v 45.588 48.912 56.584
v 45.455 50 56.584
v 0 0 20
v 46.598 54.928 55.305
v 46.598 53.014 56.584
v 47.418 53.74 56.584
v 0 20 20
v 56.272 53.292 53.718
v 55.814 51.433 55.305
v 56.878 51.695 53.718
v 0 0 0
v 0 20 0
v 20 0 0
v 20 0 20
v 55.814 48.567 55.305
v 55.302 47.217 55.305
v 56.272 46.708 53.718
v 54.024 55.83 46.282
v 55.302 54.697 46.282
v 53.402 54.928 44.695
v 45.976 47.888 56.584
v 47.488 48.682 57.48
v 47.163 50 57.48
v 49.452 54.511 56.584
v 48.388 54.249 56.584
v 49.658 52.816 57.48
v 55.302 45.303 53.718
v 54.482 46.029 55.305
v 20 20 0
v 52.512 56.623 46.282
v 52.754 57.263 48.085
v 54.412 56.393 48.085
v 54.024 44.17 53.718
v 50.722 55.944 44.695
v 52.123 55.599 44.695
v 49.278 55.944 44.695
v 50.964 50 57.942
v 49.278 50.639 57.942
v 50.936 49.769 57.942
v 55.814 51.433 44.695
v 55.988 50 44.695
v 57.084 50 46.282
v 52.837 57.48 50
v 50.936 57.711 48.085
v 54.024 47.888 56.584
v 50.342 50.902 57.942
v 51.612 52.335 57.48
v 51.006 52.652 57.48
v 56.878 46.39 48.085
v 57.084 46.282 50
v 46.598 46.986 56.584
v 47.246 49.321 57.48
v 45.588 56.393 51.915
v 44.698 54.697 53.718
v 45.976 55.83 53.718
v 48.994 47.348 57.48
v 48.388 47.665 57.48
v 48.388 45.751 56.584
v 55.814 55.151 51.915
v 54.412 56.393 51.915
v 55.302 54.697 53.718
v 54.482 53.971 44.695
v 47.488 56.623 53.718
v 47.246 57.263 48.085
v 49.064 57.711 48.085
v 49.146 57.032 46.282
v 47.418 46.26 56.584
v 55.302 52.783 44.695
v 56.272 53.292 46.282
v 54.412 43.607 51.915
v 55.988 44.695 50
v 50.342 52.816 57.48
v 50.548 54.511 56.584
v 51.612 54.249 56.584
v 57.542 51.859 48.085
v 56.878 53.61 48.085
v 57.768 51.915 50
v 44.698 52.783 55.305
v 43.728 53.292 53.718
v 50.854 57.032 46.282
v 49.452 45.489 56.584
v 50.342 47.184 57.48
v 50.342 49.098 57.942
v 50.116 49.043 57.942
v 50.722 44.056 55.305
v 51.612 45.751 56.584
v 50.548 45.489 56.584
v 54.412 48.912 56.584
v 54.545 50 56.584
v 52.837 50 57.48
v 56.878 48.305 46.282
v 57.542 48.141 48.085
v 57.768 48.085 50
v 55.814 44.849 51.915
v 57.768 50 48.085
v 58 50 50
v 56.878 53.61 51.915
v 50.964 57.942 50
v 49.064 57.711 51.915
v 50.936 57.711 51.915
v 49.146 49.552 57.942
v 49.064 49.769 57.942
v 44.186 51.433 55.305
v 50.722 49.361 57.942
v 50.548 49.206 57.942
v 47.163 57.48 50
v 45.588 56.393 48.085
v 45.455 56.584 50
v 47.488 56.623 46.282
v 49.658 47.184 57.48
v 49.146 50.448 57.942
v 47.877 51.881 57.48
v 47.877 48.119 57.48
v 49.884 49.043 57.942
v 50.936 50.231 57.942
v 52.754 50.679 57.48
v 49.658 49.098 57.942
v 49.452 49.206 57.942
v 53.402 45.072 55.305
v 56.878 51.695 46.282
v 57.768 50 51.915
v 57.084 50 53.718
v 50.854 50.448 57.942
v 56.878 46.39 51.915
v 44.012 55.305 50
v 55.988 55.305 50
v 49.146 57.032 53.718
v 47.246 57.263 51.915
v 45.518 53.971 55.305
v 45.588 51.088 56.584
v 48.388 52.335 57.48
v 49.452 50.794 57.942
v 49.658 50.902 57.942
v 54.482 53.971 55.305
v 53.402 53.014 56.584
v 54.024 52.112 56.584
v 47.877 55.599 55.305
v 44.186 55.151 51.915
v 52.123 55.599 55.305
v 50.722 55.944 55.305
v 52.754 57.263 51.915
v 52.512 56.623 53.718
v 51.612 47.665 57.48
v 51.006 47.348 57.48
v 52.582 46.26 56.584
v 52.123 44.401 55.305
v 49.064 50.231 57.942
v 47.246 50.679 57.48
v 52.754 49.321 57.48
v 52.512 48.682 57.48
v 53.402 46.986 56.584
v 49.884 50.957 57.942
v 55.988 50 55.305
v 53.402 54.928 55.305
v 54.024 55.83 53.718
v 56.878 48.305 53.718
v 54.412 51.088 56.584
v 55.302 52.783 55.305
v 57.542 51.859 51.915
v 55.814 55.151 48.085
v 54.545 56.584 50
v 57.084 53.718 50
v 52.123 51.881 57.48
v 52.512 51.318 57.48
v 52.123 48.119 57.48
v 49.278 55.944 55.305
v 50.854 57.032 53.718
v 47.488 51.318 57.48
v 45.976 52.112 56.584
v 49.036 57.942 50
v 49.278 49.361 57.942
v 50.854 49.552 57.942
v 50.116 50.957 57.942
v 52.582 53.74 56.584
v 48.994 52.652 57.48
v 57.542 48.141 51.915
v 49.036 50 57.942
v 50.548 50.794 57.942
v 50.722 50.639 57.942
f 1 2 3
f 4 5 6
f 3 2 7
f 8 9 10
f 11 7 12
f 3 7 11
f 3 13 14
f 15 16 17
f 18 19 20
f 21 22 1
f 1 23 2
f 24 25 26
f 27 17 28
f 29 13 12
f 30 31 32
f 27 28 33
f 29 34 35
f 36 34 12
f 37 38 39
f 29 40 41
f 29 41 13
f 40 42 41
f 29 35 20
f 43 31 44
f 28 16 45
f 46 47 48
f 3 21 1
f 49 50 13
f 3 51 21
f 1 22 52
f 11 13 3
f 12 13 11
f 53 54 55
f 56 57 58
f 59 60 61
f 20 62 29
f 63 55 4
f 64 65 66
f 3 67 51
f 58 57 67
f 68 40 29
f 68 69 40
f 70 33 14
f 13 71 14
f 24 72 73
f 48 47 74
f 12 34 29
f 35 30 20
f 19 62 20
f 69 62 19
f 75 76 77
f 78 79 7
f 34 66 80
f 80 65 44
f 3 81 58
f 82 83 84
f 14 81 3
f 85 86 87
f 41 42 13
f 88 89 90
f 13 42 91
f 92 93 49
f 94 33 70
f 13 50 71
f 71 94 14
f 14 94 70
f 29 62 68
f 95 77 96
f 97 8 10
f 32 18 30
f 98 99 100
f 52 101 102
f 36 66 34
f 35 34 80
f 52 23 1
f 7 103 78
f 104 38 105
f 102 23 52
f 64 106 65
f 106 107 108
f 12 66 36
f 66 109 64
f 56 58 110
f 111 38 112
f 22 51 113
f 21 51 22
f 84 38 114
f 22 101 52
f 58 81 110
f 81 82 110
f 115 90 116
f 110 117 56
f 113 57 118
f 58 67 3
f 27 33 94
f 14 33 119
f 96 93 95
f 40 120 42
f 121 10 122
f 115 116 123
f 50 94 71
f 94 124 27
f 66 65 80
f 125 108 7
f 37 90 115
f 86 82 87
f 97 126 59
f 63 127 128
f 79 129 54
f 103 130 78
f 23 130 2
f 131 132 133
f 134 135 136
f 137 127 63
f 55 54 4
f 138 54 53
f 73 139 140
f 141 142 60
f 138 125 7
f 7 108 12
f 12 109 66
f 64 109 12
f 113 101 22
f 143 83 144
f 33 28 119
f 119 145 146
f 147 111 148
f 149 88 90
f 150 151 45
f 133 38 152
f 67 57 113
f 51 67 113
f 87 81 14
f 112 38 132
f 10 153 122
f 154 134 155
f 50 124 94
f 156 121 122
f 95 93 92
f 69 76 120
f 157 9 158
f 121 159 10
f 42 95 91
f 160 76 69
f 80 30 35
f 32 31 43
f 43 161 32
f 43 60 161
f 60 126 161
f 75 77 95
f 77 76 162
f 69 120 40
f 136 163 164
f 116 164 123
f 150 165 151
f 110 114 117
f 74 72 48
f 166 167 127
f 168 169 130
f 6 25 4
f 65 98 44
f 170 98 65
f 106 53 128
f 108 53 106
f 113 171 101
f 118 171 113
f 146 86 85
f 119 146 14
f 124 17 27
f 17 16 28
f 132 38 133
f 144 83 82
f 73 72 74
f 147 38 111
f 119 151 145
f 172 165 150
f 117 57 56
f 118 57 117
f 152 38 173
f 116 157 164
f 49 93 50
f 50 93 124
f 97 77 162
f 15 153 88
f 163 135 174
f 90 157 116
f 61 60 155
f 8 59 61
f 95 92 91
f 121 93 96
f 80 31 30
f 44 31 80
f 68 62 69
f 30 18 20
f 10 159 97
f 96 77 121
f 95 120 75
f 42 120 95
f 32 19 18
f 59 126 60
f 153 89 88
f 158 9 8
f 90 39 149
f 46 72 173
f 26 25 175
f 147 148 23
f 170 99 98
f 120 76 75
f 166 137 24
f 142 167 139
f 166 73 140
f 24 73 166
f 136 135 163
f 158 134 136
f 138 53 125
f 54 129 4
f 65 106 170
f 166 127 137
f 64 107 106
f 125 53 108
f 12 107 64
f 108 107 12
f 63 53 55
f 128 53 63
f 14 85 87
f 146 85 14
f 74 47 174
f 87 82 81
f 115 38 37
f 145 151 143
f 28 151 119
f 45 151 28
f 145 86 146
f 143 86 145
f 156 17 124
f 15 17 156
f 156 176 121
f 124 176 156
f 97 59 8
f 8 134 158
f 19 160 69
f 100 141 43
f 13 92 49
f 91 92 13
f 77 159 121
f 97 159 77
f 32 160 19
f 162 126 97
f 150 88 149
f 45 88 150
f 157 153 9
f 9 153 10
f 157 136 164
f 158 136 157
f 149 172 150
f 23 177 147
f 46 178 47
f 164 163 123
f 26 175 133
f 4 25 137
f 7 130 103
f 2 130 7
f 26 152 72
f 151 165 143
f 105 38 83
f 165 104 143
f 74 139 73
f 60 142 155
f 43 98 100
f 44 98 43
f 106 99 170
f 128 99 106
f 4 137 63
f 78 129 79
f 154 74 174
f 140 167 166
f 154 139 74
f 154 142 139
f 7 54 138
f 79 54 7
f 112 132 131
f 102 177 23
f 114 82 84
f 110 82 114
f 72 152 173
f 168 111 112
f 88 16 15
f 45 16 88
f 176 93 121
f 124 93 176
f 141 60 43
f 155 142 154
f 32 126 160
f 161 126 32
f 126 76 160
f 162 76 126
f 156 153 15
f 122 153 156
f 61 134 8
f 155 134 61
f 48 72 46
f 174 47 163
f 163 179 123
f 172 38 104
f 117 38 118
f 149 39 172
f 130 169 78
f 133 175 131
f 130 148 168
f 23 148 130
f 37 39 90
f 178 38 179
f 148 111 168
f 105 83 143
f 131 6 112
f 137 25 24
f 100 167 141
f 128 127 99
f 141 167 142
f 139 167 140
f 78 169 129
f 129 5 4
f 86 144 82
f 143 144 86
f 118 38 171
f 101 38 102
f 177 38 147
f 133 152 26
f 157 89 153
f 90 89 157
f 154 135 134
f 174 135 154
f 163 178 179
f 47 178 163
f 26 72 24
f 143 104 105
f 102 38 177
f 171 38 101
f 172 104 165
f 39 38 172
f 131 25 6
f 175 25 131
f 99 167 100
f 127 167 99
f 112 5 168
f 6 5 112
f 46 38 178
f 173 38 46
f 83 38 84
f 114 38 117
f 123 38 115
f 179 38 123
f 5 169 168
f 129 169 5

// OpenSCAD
hull() {
    translate([50, 50, 50]) {
        sphere(8);
        }
    cube(20);
}
